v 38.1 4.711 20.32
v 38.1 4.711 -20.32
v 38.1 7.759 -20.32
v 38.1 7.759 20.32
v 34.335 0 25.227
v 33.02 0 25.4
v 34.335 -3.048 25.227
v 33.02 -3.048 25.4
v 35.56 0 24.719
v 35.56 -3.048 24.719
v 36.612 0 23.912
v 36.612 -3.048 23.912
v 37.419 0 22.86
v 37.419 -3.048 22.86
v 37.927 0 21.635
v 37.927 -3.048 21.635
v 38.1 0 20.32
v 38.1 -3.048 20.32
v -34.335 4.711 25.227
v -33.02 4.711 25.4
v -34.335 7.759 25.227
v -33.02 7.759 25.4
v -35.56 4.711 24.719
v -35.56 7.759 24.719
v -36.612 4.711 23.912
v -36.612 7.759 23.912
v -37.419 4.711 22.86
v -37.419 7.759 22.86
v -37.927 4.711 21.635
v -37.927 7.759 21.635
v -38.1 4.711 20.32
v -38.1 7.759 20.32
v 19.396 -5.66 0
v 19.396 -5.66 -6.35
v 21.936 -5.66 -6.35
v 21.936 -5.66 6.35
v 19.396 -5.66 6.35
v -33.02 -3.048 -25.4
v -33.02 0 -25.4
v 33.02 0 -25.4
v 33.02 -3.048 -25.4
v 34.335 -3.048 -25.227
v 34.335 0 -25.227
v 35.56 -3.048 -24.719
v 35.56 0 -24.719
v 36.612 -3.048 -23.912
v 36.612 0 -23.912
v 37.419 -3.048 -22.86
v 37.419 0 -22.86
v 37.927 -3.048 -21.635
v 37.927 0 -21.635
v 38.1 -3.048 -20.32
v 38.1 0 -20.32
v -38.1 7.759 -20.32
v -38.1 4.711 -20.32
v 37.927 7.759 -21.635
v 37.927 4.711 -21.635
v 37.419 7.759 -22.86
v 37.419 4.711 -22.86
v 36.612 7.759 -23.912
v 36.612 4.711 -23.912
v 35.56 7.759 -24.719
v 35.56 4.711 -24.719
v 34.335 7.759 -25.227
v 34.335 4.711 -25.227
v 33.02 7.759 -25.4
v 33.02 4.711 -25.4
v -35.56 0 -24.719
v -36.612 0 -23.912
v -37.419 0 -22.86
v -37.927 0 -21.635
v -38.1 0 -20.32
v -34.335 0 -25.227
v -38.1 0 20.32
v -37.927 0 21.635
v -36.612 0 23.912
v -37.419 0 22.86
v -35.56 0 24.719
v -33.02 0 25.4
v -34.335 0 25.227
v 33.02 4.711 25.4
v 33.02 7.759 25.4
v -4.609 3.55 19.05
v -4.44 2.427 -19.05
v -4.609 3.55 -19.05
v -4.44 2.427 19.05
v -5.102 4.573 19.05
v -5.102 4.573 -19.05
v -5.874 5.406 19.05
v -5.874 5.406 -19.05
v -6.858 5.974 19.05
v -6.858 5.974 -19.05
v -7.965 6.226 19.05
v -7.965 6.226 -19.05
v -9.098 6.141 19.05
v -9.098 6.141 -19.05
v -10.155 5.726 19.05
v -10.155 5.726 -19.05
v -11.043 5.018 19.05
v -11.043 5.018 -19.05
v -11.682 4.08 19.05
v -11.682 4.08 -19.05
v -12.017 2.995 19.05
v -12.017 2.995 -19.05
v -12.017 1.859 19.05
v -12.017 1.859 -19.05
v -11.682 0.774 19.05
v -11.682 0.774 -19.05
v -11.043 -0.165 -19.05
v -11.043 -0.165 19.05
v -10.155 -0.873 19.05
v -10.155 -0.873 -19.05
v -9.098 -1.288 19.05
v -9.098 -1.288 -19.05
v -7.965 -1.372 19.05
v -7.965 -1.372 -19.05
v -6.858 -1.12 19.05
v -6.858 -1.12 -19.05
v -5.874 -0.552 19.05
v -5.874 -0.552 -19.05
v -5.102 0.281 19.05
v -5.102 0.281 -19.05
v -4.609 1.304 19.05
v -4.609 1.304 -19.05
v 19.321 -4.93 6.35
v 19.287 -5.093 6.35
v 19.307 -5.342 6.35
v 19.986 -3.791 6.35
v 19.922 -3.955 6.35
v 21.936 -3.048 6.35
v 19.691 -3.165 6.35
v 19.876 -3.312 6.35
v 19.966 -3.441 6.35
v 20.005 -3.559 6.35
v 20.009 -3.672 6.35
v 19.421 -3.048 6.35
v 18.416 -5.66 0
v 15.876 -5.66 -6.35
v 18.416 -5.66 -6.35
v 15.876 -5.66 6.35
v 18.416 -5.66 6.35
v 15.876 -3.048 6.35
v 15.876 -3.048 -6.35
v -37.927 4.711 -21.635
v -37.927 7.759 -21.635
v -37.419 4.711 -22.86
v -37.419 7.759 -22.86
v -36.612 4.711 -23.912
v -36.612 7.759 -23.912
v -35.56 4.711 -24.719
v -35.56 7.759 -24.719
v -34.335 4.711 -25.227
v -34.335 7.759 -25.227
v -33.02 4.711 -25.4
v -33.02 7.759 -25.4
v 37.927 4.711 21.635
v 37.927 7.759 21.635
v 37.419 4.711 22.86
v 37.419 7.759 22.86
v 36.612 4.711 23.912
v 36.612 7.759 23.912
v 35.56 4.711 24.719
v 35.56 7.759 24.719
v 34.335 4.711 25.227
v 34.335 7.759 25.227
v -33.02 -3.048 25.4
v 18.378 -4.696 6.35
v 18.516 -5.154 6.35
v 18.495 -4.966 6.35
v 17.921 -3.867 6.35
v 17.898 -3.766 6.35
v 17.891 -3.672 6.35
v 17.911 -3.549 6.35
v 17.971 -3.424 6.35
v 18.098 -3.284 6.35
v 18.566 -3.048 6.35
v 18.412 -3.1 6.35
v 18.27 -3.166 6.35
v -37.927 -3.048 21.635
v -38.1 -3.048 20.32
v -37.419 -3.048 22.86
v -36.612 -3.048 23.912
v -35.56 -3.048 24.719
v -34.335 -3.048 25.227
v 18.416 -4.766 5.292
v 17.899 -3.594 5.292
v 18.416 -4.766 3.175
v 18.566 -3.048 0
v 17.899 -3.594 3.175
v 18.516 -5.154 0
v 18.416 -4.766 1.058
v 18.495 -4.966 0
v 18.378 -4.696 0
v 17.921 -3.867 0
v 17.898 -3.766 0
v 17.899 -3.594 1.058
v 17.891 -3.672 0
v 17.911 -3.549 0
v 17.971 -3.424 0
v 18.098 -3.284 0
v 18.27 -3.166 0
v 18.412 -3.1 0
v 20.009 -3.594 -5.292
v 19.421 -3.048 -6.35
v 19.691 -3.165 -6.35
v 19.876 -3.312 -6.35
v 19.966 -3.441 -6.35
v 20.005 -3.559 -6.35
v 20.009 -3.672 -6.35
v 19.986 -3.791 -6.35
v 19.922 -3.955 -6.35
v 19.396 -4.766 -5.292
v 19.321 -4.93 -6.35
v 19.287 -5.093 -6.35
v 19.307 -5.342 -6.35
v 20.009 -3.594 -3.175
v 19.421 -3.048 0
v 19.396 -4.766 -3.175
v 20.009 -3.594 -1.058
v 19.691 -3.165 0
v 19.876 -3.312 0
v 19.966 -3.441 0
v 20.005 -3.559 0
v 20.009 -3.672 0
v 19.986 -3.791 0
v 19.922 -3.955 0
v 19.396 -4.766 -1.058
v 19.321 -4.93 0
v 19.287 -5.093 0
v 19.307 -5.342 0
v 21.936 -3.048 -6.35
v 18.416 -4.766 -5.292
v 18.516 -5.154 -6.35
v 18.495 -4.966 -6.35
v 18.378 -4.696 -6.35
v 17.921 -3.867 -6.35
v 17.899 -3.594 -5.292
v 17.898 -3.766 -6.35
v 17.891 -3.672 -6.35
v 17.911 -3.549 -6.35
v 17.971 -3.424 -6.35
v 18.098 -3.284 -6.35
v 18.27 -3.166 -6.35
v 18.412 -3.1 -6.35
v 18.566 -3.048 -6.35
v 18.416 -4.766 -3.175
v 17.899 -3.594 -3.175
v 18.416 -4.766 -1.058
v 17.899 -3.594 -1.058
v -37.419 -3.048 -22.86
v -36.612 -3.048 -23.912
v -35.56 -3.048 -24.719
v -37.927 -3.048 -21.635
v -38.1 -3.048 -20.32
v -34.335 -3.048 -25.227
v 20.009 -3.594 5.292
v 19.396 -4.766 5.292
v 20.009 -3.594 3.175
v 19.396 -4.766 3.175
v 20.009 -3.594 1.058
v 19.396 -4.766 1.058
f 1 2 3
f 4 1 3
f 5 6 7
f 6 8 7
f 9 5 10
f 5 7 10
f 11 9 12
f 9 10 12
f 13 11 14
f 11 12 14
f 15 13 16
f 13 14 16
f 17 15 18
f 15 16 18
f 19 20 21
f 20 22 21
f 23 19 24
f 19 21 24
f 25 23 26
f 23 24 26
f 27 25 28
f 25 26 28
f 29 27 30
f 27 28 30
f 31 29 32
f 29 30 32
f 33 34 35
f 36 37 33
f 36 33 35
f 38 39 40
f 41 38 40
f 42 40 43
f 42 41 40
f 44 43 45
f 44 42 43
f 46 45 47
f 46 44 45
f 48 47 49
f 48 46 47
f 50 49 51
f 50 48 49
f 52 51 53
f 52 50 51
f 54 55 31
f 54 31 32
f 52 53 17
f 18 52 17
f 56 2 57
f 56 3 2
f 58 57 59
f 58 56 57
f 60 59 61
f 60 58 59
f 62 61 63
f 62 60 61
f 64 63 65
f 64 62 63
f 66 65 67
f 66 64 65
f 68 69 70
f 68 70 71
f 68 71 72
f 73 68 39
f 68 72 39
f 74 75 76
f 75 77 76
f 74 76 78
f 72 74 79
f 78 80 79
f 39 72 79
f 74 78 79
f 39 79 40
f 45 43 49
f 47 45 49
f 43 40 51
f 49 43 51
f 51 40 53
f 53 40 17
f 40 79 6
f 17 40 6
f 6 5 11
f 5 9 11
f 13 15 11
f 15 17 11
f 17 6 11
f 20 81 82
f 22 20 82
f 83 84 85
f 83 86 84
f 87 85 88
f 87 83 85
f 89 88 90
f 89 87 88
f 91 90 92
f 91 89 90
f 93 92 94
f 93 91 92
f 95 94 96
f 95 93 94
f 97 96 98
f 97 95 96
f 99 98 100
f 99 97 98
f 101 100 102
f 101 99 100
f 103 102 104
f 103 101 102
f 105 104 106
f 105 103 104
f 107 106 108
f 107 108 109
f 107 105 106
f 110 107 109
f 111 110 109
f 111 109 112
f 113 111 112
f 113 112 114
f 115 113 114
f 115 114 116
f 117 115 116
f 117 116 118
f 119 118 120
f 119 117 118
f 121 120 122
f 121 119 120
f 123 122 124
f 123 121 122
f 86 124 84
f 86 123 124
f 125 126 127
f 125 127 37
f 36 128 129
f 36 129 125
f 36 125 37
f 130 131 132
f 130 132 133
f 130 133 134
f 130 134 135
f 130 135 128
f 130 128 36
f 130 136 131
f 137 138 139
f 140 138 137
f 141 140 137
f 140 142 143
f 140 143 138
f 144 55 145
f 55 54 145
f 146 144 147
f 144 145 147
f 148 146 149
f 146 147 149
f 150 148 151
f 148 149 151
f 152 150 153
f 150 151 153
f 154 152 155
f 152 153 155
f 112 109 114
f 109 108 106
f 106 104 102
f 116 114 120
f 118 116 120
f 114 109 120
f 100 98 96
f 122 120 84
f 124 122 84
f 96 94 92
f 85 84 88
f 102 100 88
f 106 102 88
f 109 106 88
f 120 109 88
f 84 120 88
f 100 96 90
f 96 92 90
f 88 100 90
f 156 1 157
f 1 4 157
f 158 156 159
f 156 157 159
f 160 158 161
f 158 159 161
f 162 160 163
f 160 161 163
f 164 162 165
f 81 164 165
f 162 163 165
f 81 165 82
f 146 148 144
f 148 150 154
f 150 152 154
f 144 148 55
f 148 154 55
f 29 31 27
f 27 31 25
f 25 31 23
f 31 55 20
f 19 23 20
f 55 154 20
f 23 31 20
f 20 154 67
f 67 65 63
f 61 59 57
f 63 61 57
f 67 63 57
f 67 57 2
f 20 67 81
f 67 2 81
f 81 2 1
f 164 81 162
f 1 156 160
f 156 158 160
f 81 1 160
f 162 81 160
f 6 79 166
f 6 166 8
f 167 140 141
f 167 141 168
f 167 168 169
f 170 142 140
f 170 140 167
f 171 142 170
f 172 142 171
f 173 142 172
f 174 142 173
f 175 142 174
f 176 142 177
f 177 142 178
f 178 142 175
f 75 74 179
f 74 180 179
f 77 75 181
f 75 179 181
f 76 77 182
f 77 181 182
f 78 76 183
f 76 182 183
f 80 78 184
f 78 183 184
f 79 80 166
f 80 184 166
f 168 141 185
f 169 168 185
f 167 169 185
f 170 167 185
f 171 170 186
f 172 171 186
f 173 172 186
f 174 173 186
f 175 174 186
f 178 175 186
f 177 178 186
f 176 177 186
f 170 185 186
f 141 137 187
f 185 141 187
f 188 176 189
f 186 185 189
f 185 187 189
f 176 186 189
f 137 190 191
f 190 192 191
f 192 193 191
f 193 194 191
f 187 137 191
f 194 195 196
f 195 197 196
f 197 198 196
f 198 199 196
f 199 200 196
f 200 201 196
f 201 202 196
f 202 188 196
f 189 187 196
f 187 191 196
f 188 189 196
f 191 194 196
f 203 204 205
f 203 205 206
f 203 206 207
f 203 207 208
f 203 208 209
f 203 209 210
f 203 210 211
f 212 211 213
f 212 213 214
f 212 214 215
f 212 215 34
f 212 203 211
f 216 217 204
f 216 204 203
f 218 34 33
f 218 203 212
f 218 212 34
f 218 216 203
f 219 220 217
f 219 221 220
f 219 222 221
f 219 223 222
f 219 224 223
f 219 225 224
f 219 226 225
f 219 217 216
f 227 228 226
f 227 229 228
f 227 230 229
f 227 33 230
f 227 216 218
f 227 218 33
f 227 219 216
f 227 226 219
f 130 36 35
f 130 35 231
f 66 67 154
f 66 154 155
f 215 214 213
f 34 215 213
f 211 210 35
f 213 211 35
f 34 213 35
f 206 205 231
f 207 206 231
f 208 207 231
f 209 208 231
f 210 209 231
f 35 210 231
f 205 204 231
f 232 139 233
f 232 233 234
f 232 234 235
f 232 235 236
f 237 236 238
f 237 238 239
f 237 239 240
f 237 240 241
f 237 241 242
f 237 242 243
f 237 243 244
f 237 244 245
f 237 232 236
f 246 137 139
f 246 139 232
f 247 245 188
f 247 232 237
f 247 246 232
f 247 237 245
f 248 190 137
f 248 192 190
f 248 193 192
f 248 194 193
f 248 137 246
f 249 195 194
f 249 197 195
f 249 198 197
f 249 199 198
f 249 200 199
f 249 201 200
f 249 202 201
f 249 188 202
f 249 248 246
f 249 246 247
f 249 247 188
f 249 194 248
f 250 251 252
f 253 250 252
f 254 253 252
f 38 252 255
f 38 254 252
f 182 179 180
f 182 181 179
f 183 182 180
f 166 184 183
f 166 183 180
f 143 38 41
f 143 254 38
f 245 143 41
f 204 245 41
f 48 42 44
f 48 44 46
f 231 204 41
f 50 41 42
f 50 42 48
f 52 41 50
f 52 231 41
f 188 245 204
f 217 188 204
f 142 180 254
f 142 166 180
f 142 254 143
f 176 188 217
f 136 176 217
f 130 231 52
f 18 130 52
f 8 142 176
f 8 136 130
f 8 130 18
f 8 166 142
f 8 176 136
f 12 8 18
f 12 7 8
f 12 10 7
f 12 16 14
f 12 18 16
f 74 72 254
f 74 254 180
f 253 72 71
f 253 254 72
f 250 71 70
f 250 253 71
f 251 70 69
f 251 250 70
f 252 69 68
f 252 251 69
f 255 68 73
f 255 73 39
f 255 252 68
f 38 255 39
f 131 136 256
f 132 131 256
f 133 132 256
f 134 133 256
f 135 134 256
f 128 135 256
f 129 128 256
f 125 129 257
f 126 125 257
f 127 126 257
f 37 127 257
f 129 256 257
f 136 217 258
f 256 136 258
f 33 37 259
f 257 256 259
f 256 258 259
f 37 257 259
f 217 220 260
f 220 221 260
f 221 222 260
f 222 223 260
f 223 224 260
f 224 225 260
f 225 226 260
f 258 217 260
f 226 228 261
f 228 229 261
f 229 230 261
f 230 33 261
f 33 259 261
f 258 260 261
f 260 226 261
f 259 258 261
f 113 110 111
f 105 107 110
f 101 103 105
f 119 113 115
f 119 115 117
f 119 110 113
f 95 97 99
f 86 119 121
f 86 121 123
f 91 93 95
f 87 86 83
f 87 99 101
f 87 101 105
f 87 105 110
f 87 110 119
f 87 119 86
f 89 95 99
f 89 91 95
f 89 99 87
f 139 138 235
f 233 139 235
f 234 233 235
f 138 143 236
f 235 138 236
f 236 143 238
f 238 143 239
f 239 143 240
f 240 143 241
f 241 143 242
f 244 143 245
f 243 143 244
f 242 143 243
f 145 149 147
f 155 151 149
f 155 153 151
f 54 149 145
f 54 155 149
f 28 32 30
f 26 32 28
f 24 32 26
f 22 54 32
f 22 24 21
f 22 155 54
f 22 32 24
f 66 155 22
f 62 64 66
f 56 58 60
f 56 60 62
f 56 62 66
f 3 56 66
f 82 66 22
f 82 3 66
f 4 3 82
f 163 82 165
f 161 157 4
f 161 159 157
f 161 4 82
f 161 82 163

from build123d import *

# Parameters (mm, degrees)
F0_W     = 76.2
F0_H     = 50.8
F1_DEPTH = 3.048
F2_R     = 3.81
F3_DEPTH = 19.05
F4_W     = 3.048
F4_H     = 50.8
F5_DEPTH = 38.1
F7_DEPTH = 6.35
F8_R     = 5.08
F8_2_R   = 5.08


with BuildPart() as f1:
    # F0 (on Front) → F1 (new body)
    with BuildSketch(Plane.XZ):
        Rectangle(F0_W, F0_H)
    extrude(amount=F1_DEPTH)

    # F6 (on Top) → F7 (join, symmetric)
    with BuildSketch(Plane.XY):
        with BuildLine():
            Line((15.8757737679, -2.8663004731), (15.8757737679, -5.6603004731))
            Line((15.8757737679, -5.6603004731), (18.4157737679, -5.6603004731))
            add(Edge.make_bspline(
                [(18.4157737679, -5.6603004731), (18.5378119349, -5.2307397127), (18.587871301, -4.8250919449), (17.4133170665, -3.481495643), (19.0541167471, -2.7333095545), (20.4624615392, -3.5273871295), (19.2137760288, -4.8082813428), (19.2581992596, -5.2407453768), (19.3957253211, -5.6603004731)],
                knots=[0, 0, 0, 0, 0.1482829935, 0.3256724834, 0.5043079551, 0.6714267649, 0.8517170065, 1, 1, 1, 1], degree=3))
            Line((19.3957253211, -5.6603004731), (21.9357253211, -5.6603004731))
            Line((21.9357253211, -5.6603004731), (21.9357253211, -2.8663004731))
            add(Edge.make_bspline(
                [(15.8757737679, -2.8663004731), (16.3097436066, -2.6514092968), (18.9049454854, -1.1739170041), (21.5033636007, -2.6444883167), (21.9357253211, -2.8663004731)],
                knots=[0, 0, 0, 0, 0.5, 1, 1, 1, 1], degree=3))
        make_face()
    extrude(amount=F7_DEPTH, both=True)

    # F8
    f8_edges = [f1.edges().sort_by_distance(p)[0] for p in [
        (38.1, -1.524, -25.4),
        (-38.1, -1.524, -25.4),
        (38.1, -1.524, 25.4),
        (-38.1, -1.524, 25.4),
    ]]
    fillet(f8_edges, radius=F8_R)


with BuildPart() as f3:
    # F2 (on Top) → F3 (new body, symmetric)
    with BuildSketch(Plane.XY):
        with Locations((-8.2497447729, 2.4268818088)):
            Circle(F2_R)
    extrude(amount=F3_DEPTH, both=True)


with BuildPart() as f5:
    # F4 (on Right) → F5 (new body, symmetric)
    with BuildSketch(Plane.YZ):
        with Locations((6.2352120028, 0)):
            Rectangle(F4_W, F4_H)
    extrude(amount=F5_DEPTH, both=True)

    # F8#2
    f8_2_edges = [f5.edges().sort_by_distance(p)[0] for p in [
        (38.1, 6.235212, -25.4),
        (-38.1, 6.235212, -25.4),
        (38.1, 6.235212, 25.4),
        (-38.1, 6.235212, 25.4),
    ]]
    fillet(f8_2_edges, radius=F8_2_R)


solid = Compound([f1.part, f3.part, f5.part])
